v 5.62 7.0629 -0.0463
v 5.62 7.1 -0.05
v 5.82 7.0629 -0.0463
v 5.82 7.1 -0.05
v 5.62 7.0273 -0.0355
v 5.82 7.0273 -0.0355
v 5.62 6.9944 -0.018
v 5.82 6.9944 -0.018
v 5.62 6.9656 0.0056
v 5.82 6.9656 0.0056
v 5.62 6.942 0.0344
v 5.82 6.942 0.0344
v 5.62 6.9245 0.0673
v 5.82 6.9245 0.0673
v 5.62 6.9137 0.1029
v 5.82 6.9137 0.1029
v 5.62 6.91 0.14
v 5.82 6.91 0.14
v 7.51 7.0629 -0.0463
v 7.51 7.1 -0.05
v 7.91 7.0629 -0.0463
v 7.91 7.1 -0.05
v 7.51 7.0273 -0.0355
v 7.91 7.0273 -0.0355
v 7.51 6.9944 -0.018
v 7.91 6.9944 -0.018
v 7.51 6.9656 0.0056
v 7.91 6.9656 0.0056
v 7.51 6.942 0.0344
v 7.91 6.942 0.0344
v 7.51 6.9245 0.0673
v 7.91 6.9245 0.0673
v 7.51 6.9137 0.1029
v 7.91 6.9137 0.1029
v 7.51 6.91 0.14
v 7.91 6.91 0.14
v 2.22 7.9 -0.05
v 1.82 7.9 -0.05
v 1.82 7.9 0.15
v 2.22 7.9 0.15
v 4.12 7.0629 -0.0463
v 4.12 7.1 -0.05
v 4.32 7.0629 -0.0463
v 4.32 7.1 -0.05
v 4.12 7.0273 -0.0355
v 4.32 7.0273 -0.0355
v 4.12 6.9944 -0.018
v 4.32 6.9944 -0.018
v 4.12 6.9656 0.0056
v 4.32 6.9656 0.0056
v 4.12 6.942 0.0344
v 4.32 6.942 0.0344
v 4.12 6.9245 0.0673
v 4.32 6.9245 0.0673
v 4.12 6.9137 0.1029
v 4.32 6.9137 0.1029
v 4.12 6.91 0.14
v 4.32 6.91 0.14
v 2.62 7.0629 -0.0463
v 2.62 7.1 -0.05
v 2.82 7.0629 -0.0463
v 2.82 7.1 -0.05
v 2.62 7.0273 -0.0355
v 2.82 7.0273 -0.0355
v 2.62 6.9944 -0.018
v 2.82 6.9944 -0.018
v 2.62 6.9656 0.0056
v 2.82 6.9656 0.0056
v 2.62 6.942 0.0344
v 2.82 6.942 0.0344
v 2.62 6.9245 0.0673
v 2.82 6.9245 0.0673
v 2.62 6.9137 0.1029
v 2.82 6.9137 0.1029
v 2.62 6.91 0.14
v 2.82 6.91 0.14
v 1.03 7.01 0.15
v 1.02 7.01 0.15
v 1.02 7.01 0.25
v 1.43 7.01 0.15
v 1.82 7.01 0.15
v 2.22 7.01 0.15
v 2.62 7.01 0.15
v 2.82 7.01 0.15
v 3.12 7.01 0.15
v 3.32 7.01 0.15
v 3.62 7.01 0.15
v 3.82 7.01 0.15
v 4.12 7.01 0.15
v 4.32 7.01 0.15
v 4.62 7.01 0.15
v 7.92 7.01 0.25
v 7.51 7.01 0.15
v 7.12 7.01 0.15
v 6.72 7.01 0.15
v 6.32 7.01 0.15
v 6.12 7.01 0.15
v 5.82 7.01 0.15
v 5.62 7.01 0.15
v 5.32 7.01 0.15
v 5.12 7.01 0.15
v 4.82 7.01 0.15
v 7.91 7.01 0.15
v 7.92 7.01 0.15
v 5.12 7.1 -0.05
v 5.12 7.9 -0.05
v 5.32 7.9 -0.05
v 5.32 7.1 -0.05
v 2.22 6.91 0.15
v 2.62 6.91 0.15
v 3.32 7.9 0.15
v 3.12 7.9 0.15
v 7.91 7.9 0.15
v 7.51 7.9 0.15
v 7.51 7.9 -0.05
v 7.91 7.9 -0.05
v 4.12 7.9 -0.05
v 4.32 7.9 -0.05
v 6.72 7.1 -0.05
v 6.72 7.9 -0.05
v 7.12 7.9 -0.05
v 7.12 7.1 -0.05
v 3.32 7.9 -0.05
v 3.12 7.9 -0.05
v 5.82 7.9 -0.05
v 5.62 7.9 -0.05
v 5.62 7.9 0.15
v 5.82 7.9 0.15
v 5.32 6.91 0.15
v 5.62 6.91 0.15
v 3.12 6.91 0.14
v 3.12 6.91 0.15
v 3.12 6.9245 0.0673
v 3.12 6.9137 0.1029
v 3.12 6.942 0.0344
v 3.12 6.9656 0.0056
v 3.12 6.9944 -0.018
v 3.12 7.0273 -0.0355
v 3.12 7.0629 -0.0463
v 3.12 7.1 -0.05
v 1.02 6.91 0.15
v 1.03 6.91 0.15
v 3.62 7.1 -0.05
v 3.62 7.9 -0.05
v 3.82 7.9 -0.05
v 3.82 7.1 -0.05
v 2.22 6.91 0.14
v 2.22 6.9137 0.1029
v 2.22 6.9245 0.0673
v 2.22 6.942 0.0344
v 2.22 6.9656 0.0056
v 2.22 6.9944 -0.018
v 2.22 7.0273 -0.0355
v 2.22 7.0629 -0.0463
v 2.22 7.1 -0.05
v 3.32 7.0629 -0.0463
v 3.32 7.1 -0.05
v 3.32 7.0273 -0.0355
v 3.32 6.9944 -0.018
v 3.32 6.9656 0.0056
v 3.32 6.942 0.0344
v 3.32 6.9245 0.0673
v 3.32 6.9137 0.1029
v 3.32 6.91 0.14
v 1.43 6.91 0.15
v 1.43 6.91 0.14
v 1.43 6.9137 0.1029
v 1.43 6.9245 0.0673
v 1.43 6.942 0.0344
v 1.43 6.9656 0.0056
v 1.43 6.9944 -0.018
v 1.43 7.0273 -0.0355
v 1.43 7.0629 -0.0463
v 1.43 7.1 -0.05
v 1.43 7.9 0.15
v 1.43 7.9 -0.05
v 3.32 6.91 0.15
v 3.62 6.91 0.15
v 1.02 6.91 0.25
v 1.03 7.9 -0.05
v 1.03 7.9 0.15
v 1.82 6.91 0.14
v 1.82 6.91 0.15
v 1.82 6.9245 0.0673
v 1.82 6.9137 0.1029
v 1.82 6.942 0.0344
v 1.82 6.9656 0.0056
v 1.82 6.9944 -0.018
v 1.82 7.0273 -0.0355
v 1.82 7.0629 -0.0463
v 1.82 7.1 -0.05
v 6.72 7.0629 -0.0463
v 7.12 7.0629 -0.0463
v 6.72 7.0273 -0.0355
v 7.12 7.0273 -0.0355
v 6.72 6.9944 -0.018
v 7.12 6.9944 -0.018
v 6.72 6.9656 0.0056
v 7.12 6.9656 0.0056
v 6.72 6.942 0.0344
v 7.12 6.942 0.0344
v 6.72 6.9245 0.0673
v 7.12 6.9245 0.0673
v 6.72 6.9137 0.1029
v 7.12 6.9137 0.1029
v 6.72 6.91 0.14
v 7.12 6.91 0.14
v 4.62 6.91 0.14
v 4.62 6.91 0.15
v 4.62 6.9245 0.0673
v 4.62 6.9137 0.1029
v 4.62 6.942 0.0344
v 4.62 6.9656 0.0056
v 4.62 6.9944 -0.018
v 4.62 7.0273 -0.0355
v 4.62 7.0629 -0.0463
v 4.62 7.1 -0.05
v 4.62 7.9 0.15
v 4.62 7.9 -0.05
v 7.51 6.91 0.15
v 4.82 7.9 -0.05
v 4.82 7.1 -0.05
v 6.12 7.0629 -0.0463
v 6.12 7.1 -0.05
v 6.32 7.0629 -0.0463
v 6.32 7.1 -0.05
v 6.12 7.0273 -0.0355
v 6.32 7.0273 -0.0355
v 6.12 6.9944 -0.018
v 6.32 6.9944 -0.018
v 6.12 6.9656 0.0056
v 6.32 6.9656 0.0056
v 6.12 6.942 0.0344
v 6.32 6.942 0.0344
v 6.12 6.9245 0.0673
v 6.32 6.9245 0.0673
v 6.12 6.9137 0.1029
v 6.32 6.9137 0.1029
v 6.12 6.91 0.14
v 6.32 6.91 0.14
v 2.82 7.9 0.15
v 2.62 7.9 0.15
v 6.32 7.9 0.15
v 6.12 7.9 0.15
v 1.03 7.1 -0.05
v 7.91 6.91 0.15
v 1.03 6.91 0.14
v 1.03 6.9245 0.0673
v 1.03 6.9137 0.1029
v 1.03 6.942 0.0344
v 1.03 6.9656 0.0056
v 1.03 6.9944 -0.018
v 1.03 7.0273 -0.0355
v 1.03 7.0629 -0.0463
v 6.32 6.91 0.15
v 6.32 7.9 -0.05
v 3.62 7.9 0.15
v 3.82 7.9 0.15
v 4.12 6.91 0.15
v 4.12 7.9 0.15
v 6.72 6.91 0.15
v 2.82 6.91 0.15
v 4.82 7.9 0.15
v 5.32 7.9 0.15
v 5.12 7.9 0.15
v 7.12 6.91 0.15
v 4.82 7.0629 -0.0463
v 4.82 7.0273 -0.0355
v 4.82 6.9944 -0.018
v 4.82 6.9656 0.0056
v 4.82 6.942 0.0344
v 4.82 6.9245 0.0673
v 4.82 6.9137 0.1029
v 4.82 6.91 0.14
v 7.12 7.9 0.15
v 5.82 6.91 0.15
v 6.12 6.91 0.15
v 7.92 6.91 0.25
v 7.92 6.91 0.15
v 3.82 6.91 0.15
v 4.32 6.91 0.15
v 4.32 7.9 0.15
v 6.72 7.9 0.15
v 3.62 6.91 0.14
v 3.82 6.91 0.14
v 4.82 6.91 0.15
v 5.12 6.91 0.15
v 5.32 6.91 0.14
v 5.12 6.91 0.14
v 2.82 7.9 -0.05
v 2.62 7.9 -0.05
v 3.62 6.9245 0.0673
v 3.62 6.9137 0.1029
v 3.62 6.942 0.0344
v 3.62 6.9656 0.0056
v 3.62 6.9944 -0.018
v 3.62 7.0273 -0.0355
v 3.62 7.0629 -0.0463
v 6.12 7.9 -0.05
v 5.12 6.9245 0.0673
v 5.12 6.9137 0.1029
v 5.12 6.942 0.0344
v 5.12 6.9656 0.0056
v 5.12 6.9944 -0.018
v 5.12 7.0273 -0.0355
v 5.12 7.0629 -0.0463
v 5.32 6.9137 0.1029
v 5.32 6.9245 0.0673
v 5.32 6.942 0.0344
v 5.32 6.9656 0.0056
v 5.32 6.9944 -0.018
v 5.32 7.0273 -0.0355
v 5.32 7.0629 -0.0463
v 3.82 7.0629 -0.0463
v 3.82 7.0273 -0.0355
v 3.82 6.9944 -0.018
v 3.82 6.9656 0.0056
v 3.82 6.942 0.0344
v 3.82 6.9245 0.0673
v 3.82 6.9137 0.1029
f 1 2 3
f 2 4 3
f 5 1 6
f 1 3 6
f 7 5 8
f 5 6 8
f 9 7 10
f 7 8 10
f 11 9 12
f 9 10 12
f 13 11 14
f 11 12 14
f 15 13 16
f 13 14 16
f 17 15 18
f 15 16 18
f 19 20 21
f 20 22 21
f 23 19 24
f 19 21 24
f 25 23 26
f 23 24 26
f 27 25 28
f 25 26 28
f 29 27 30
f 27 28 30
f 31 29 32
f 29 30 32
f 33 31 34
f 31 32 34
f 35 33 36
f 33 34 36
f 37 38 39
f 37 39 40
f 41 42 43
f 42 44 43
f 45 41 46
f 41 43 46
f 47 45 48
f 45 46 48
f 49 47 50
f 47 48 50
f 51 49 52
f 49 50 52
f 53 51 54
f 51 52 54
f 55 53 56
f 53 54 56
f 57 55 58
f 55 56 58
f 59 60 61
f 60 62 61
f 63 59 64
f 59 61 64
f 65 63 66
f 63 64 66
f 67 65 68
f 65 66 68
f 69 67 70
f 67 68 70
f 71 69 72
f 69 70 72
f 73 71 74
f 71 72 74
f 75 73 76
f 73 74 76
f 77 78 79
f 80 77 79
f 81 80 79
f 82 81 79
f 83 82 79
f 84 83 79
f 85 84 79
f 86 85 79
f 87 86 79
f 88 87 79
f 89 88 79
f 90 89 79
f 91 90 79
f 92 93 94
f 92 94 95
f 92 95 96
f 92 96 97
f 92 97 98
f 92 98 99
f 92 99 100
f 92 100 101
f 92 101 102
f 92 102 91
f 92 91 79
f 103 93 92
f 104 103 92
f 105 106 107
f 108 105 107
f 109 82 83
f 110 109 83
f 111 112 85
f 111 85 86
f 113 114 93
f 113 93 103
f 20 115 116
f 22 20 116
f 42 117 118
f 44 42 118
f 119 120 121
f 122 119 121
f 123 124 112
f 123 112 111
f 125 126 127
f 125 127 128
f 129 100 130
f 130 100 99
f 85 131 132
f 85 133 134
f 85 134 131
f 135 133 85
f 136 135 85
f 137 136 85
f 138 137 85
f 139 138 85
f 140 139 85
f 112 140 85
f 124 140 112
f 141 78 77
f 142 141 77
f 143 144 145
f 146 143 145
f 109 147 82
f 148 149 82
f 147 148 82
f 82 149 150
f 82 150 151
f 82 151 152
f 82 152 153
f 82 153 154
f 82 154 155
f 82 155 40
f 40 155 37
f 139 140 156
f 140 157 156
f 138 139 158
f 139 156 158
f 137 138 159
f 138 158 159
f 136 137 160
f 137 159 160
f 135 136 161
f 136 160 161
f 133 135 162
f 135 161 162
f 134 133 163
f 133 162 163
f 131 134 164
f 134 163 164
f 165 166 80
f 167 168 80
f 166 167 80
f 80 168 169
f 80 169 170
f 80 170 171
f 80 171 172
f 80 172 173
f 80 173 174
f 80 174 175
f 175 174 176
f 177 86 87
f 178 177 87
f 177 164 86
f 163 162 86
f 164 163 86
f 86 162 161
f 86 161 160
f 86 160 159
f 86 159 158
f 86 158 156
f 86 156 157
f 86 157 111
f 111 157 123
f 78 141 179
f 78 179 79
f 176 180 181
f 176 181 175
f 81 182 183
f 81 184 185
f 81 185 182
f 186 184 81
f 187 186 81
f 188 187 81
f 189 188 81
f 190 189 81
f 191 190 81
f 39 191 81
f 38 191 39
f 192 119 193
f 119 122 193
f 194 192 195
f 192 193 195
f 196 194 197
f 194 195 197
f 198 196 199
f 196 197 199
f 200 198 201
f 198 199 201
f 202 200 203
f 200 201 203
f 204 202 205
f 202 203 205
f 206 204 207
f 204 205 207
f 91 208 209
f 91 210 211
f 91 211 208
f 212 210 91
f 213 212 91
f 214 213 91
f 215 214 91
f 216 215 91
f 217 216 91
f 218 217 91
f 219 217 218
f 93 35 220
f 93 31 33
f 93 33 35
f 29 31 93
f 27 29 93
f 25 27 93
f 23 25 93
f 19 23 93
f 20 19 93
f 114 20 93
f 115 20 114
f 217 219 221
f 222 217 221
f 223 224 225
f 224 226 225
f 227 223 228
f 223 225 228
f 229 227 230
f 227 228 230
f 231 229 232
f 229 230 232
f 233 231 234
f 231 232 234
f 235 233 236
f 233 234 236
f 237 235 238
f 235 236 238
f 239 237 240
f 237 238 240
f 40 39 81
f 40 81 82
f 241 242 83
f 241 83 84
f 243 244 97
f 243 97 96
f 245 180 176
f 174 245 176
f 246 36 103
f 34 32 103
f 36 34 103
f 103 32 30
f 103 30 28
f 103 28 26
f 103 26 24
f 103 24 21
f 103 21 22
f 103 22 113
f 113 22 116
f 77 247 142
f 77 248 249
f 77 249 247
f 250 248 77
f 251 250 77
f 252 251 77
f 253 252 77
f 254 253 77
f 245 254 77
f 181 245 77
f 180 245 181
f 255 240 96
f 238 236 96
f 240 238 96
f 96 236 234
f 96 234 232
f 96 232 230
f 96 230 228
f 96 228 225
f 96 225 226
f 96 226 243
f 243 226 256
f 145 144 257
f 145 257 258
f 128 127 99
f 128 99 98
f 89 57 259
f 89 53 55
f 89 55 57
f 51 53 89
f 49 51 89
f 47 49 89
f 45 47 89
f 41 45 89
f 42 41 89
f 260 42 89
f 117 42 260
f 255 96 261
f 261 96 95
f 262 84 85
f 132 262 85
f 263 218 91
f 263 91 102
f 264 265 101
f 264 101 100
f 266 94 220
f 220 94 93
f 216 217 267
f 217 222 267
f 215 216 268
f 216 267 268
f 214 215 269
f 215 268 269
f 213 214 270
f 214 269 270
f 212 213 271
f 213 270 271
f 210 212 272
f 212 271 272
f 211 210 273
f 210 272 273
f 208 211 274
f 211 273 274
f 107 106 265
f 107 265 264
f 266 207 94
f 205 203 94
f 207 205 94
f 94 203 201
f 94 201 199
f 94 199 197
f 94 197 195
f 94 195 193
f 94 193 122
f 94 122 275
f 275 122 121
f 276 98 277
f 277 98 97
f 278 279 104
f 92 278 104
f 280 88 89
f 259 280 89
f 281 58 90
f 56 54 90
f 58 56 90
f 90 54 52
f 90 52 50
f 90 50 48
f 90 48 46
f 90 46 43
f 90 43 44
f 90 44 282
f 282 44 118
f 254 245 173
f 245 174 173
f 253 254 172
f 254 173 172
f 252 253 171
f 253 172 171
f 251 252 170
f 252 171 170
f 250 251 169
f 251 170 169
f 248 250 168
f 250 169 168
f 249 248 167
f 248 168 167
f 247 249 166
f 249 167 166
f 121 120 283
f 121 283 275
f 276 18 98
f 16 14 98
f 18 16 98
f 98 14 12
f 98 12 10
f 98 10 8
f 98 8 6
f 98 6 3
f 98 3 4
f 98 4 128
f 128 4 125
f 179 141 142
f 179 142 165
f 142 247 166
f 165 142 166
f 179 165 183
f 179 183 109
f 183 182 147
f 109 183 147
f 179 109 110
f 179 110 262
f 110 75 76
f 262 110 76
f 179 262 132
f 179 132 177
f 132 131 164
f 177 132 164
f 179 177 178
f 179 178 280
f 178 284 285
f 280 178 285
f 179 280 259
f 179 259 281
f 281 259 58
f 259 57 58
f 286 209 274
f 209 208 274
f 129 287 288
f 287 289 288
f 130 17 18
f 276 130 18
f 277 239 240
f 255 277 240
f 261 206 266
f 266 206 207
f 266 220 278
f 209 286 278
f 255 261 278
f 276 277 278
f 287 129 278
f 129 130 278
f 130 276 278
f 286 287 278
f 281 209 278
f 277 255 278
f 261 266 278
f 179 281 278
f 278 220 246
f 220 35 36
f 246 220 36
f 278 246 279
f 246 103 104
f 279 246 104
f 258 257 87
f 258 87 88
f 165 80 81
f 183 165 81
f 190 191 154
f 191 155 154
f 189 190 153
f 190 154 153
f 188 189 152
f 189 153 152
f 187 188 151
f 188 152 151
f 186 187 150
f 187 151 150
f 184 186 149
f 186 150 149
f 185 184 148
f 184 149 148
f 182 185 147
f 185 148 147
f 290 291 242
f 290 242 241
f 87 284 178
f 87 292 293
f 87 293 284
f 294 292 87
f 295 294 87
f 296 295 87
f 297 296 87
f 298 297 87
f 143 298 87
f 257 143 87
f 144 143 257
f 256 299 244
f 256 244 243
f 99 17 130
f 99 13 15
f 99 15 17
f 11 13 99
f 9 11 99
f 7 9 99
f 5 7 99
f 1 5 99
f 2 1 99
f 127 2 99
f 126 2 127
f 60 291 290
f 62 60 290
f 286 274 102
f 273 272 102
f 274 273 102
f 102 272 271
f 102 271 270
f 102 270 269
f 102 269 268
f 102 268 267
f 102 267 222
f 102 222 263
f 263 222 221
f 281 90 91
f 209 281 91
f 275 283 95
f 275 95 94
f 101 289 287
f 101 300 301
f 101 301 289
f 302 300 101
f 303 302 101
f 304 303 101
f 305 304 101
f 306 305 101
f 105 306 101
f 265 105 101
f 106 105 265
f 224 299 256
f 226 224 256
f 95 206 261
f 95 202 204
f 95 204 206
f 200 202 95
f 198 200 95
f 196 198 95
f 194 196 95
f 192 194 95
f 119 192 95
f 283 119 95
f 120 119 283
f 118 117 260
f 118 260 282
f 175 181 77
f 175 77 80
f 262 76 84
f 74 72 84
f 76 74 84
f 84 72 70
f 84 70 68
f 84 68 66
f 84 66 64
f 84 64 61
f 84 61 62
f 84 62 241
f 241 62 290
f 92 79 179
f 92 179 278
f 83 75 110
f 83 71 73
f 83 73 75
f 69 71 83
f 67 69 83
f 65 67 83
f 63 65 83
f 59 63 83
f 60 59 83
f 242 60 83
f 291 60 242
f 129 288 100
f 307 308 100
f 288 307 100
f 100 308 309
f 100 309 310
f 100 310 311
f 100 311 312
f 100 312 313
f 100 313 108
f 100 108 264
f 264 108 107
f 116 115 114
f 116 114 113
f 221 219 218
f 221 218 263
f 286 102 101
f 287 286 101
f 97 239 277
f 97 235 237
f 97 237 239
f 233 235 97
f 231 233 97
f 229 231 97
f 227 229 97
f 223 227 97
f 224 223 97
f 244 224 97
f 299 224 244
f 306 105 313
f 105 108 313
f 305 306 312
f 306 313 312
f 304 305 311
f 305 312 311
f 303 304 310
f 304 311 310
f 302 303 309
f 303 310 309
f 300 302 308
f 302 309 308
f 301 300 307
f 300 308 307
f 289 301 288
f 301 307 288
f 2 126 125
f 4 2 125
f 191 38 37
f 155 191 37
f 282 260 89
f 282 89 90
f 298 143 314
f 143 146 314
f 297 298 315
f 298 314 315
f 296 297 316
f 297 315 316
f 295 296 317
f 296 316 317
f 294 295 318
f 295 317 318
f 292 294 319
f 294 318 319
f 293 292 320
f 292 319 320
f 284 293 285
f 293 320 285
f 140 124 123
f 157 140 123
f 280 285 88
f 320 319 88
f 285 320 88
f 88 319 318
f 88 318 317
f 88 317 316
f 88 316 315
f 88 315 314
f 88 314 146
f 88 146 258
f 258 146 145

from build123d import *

# Parameters (mm, degrees)
SKETCH015_W  = 6.9
SKETCH015_H  = 0.1
PAD008_DEPTH = 0.1
SKETCH017_W  = 0.2
SKETCH017_H  = 0.99
PAD009_DEPTH = 0.2
SKETCH018_W  = 0.2
SKETCH018_H  = 0.99
PAD010_DEPTH = 0.2
FILLET003_R  = 0.19


with BuildPart() as part:
    # Sketch015 → Pad008 (new body)
    with BuildSketch(Plane.XY.offset(0.15)):
        with Locations((4.47, 6.96)):
            Rectangle(SKETCH015_W, SKETCH015_H)
    extrude(amount=PAD008_DEPTH)

    # Sketch017 → Pad009 (join)
    with BuildSketch(Plane.XY.offset(-0.05)):
        with Locations((1.33, 7.405)):
            Rectangle(SKETCH017_W, SKETCH017_H)
        with Locations((2.12, 7.405)):
            Rectangle(SKETCH017_W, SKETCH017_H)
        with Locations((2.72, 7.405)):
            Rectangle(SKETCH017_W, SKETCH017_H)
        with Locations((3.22, 7.405)):
            Rectangle(SKETCH017_W, SKETCH017_H)
        with Locations((3.72, 7.405)):
            Rectangle(SKETCH017_W, SKETCH017_H)
        with Locations((4.22, 7.405)):
            Rectangle(SKETCH017_W, SKETCH017_H)
        with Locations((4.72, 7.405)):
            Rectangle(SKETCH017_W, SKETCH017_H)
        with Locations((5.22, 7.405)):
            Rectangle(SKETCH017_W, SKETCH017_H)
        with Locations((5.72, 7.405)):
            Rectangle(SKETCH017_W, SKETCH017_H)
        with Locations((6.22, 7.405)):
            Rectangle(SKETCH017_W, SKETCH017_H)
        with Locations((6.82, 7.405)):
            Rectangle(SKETCH017_W, SKETCH017_H)
        with Locations((7.61, 7.405)):
            Rectangle(SKETCH017_W, SKETCH017_H)
    extrude(amount=PAD009_DEPTH)

    # Sketch018 → Pad010 (join)
    with BuildSketch(Plane.XY.offset(-0.05)):
        with Locations((1.13, 7.405)):
            Rectangle(SKETCH018_W, SKETCH018_H)
        with Locations((1.92, 7.405)):
            Rectangle(SKETCH018_W, SKETCH018_H)
        with Locations((7.02, 7.405)):
            Rectangle(SKETCH018_W, SKETCH018_H)
        with Locations((7.81, 7.405)):
            Rectangle(SKETCH018_W, SKETCH018_H)
    extrude(amount=PAD010_DEPTH)

    # Fillet003
    fillet003_edges = [part.edges().sort_by_distance(p)[0] for p in [
        (7.81, 6.91, -0.05),
        (7.61, 6.91, -0.05),
        (7.02, 6.91, -0.05),
        (6.82, 6.91, -0.05),
        (6.22, 6.91, -0.05),
        (5.72, 6.91, -0.05),
        (5.22, 6.91, -0.05),
        (4.72, 6.91, -0.05),
        (4.22, 6.91, -0.05),
        (3.72, 6.91, -0.05),
        (3.22, 6.91, -0.05),
        (2.72, 6.91, -0.05),
        (2.12, 6.91, -0.05),
        (1.92, 6.91, -0.05),
        (1.33, 6.91, -0.05),
        (1.13, 6.91, -0.05),
    ]]
    fillet(fillet003_edges, radius=FILLET003_R)


solid = part.part
